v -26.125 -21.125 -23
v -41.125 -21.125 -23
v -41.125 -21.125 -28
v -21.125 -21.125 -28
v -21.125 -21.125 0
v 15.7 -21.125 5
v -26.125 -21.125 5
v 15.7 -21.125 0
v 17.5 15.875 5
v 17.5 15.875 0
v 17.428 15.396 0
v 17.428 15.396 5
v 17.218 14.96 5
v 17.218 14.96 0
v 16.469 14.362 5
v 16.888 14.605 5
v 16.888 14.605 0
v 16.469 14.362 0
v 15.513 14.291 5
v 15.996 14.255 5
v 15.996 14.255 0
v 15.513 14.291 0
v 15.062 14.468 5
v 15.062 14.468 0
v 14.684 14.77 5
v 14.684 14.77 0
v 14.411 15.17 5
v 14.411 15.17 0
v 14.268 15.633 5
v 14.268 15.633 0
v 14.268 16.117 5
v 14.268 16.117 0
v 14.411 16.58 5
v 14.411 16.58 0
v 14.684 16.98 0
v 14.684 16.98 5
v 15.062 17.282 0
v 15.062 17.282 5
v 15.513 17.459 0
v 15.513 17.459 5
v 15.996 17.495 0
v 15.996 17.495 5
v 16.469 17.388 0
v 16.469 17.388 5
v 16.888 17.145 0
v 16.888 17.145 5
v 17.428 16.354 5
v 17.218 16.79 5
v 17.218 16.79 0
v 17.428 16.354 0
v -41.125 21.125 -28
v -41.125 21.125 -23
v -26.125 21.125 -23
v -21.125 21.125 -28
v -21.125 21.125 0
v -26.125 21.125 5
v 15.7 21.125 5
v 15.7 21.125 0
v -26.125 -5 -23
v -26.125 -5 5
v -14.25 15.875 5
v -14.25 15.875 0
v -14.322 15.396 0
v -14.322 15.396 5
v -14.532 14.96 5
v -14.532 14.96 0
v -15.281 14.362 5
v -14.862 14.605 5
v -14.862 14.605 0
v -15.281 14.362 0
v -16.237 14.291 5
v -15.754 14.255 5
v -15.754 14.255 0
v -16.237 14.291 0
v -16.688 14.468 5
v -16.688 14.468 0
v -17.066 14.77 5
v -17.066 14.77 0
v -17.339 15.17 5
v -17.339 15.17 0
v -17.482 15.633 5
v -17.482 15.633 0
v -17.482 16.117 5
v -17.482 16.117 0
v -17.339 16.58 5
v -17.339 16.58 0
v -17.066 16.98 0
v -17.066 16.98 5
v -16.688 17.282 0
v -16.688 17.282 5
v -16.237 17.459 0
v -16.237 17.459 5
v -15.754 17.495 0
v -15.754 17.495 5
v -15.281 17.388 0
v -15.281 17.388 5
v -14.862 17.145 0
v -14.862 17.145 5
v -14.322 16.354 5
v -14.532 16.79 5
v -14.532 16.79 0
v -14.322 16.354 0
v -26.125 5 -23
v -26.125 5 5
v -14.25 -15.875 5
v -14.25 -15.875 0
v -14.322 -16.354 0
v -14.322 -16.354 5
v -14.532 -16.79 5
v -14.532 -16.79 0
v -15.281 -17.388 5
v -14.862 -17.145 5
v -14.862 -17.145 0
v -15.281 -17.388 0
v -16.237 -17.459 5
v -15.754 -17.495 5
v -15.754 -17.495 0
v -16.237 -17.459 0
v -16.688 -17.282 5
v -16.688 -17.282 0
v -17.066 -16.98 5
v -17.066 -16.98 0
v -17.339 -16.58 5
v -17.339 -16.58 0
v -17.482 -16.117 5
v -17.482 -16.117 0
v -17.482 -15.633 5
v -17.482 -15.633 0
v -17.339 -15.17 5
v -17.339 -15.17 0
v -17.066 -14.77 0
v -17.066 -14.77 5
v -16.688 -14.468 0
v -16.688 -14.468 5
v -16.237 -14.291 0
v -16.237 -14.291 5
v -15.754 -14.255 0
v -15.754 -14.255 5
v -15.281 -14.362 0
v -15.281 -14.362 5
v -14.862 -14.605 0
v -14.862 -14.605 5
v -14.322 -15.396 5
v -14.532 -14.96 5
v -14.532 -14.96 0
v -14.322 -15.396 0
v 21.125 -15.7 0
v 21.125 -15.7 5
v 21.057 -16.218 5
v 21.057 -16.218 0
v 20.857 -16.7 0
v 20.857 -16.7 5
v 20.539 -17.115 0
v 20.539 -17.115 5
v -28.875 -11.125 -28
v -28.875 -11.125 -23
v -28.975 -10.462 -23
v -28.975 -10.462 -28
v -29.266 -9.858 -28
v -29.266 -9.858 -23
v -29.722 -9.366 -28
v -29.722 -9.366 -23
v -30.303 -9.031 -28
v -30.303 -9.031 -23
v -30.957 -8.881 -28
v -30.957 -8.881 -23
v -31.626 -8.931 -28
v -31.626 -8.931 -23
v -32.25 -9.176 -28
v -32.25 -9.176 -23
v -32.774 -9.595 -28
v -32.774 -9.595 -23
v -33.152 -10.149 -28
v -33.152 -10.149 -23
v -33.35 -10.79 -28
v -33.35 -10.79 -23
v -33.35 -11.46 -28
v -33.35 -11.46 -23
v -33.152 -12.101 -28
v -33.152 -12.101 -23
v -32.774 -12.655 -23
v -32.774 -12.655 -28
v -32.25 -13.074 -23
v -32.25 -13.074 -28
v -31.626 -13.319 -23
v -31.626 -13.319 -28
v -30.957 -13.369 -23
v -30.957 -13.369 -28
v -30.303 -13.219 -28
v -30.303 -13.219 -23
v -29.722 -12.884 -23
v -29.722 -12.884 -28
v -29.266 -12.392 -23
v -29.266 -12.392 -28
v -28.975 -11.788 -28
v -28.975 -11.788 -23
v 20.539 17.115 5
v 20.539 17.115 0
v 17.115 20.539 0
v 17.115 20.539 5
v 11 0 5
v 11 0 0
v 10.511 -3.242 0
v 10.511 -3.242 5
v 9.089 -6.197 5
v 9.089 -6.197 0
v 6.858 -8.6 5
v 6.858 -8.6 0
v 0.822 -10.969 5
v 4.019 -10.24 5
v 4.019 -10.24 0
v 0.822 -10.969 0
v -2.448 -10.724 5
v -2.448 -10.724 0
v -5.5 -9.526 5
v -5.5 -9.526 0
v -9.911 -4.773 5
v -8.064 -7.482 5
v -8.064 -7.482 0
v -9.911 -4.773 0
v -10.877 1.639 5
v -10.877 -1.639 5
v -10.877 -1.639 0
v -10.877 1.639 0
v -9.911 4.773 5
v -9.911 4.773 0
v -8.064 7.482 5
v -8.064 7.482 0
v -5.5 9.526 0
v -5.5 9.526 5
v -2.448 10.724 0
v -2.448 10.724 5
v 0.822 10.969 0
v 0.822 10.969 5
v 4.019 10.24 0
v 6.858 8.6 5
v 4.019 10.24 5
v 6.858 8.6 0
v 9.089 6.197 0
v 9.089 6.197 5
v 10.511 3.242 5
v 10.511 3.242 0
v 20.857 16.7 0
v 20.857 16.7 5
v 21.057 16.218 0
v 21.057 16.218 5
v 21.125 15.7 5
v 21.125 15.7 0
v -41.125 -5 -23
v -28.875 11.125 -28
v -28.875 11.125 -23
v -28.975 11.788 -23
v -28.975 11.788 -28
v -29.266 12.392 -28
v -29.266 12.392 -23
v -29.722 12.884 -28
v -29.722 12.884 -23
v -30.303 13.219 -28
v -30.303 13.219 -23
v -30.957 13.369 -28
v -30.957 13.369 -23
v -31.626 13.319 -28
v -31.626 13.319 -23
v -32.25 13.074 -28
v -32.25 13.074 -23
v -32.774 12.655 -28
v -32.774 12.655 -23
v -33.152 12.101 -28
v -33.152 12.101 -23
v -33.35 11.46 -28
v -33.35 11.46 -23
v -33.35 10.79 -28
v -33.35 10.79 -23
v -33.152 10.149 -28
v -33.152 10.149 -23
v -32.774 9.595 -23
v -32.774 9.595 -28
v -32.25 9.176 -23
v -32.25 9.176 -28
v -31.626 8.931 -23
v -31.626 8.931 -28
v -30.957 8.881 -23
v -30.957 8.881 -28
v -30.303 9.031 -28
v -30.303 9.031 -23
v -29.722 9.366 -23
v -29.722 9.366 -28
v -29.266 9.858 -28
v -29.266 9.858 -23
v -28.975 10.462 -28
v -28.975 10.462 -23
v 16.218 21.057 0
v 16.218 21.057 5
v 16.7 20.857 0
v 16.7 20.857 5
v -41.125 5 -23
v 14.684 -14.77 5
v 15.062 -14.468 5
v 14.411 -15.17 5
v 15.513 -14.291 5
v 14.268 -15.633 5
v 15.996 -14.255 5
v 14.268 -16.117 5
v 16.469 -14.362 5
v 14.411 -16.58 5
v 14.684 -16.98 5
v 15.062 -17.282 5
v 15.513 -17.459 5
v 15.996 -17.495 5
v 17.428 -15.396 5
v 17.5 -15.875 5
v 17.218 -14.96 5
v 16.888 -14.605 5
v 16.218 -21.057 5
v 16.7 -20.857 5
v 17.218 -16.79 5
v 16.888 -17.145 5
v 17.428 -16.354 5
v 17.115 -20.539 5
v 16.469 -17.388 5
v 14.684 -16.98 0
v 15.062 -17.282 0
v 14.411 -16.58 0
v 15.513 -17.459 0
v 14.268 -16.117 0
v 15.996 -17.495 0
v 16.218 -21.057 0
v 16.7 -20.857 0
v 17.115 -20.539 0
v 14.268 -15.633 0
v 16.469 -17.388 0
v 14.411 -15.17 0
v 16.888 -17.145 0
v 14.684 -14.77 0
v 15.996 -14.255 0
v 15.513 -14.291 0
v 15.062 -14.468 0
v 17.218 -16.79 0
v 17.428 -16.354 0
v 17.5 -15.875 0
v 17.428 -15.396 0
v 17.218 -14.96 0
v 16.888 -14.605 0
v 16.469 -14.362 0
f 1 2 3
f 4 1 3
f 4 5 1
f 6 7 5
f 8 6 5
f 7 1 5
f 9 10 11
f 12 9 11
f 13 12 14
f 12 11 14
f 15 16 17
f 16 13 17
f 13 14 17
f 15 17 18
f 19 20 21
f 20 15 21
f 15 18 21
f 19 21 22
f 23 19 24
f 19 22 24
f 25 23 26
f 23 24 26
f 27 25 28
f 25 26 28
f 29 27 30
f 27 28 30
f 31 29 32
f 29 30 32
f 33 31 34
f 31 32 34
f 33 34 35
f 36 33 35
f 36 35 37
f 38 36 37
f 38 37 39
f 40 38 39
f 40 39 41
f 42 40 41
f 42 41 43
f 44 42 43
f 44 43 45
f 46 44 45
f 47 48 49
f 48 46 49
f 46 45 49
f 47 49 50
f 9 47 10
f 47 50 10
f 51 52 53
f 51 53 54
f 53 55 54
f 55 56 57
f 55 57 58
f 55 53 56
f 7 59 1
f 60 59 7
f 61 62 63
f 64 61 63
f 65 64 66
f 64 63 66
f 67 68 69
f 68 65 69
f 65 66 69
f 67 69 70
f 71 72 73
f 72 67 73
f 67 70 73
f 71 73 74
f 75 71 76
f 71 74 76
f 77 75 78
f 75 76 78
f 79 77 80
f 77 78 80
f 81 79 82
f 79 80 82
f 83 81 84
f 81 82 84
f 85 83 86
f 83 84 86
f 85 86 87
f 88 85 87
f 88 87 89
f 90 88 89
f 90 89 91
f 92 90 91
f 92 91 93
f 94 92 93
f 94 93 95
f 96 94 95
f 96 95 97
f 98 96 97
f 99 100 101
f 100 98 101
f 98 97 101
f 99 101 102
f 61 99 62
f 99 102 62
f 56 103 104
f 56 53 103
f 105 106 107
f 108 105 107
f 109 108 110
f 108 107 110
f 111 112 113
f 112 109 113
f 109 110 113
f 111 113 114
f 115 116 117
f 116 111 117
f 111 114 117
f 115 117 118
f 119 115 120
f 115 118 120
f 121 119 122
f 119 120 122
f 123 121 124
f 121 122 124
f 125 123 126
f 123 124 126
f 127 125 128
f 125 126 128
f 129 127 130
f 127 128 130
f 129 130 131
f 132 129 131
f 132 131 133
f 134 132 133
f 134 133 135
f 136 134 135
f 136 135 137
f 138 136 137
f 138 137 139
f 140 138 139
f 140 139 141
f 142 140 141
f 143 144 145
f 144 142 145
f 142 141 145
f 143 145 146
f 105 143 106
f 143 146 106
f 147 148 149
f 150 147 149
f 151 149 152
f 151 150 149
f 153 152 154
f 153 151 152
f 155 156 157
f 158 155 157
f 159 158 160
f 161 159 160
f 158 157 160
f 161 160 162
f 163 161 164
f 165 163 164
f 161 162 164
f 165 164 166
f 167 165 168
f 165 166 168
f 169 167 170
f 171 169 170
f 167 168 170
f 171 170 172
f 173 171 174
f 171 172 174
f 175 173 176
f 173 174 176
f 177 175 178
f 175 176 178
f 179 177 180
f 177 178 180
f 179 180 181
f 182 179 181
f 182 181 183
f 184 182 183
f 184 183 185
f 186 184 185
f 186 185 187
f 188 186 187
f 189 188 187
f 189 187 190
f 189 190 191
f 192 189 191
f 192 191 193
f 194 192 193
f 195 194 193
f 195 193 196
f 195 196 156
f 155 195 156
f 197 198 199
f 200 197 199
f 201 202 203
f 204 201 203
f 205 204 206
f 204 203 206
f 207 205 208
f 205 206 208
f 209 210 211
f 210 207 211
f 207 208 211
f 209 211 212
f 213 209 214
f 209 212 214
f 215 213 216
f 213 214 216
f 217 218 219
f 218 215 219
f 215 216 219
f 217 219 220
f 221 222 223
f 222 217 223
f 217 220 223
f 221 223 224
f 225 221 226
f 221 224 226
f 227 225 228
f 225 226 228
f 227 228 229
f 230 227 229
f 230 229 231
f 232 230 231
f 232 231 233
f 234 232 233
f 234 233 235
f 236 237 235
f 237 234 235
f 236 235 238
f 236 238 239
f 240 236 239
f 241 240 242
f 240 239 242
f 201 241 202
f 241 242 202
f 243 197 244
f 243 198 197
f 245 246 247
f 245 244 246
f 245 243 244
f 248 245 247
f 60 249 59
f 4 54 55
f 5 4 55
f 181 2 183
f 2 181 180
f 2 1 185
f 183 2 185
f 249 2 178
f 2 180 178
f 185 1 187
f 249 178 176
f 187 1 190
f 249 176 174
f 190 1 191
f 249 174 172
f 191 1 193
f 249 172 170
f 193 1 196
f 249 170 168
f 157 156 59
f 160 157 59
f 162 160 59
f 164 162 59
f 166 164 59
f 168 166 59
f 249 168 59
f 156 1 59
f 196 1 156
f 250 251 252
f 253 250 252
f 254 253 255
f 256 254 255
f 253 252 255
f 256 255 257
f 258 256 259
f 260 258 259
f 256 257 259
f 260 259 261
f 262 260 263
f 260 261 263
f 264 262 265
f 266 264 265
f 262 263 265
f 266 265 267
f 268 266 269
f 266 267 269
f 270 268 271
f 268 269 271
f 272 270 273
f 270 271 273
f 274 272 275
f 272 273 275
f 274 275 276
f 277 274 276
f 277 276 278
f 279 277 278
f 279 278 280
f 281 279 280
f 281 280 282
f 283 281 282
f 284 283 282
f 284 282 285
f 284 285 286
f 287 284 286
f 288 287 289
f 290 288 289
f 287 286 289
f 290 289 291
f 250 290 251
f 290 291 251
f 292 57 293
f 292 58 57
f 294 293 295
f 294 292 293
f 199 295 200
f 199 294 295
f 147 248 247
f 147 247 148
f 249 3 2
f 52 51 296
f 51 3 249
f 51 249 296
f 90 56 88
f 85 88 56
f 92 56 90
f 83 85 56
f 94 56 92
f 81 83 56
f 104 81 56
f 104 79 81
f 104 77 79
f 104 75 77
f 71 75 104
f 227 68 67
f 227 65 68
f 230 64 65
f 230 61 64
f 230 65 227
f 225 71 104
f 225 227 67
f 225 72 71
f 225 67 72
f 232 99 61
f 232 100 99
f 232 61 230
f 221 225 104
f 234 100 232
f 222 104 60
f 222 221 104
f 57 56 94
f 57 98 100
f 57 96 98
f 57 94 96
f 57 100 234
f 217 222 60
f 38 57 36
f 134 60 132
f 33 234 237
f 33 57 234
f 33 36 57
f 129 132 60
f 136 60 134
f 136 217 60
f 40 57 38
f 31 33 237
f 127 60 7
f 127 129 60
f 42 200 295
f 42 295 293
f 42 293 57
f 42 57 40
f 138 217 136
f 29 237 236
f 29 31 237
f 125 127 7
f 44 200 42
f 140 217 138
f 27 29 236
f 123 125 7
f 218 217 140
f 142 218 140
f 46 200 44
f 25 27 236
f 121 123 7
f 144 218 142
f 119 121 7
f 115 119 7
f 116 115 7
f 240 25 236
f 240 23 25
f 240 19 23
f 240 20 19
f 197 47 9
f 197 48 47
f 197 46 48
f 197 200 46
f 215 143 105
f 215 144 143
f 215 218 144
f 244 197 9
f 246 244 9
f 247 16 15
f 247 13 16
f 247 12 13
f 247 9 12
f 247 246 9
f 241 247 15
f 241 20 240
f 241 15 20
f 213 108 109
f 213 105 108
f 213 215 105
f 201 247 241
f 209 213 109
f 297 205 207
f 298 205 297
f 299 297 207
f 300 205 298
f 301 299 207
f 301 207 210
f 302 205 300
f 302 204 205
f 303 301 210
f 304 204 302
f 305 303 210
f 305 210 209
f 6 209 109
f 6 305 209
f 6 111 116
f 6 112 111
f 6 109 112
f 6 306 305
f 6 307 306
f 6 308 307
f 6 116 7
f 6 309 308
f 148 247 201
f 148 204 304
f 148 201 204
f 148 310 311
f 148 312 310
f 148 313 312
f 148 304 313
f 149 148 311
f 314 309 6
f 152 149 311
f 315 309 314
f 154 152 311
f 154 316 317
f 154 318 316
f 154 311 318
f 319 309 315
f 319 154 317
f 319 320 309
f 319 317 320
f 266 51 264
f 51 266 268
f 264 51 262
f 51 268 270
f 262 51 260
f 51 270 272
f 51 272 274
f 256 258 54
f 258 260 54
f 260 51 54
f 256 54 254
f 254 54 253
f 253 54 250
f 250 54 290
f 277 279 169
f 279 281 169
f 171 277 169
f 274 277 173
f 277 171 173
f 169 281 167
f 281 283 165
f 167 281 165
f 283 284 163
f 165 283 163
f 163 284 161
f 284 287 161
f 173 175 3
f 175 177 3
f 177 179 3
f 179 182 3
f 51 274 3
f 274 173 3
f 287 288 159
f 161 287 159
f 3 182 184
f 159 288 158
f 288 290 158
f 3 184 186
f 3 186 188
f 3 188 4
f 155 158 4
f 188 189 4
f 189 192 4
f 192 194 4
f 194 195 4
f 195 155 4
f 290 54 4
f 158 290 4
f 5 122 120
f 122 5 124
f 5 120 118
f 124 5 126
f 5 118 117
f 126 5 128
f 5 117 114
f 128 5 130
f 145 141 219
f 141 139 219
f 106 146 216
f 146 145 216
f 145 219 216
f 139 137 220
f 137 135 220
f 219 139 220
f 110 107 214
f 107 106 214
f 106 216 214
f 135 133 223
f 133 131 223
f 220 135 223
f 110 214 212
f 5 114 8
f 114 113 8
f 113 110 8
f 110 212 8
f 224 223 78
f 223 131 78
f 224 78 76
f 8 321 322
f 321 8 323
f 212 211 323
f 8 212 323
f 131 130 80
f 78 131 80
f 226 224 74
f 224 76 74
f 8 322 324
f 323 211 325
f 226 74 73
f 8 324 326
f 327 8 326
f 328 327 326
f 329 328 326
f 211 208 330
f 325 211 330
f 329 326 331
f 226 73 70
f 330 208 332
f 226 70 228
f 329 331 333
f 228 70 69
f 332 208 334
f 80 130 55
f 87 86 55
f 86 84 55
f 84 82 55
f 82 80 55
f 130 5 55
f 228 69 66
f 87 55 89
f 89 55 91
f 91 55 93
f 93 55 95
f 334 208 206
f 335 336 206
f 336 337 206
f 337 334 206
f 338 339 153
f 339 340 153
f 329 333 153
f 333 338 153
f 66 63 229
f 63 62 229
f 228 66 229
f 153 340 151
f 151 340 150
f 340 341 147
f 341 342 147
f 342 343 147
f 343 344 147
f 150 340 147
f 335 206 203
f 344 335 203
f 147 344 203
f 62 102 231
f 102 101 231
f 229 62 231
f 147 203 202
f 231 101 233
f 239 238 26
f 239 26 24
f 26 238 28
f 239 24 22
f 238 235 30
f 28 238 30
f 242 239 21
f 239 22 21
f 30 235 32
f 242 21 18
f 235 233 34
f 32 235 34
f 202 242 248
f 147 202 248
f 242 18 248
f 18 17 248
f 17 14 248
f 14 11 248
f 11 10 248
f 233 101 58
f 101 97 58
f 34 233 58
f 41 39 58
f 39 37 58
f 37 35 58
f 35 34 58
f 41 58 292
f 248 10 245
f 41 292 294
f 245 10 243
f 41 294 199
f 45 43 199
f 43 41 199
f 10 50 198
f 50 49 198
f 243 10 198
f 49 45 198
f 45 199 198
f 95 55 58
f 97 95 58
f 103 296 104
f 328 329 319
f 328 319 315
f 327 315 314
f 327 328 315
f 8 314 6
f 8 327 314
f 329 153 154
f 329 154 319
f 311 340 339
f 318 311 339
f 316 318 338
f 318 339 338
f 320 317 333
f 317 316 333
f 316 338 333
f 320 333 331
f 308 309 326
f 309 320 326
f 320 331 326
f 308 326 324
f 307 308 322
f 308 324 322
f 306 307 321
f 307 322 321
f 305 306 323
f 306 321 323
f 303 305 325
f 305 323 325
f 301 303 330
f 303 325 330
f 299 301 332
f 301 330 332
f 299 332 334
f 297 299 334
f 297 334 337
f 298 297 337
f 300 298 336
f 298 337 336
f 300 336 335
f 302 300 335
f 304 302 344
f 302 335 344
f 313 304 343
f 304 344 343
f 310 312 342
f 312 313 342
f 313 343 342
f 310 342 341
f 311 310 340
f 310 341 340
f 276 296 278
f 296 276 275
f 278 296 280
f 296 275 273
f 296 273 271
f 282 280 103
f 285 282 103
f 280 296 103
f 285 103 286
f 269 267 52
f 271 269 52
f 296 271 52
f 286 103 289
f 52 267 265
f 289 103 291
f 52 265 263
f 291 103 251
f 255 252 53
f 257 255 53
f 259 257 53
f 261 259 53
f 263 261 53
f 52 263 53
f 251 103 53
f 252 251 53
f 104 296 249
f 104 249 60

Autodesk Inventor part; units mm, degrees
ref_plane "YZ Plane" through (0, 0, 0) normal (1, 0, 0) x (0, 1, 0)
ref_plane "XZ Plane" through (0, 0, 0) normal (0, 1, 0) x (-1, 0, 0)
sketch "Sketch1" plane through (0, 0, 0) normal (0, 0, 1) x (1, 0, 0)
  arc A0 (-20.5392, 17.1146) -> (-21.125, 15.7004) centre (-19.125, 15.7004) ccw projected
  line L0 (-21.125, -15.7004) -> (-21.125, 15.7004) projected
  arc A1 (-21.125, -15.7004) -> (-20.5392, -17.1146) centre (-19.125, -15.7004) ccw projected
  line L1 (-20.5392, -17.1146) -> (-17.1146, -20.5392) projected
  arc A2 (-17.1146, -20.5392) -> (-15.7004, -21.125) centre (-15.7004, -19.125) ccw projected
  line L2 (15.7004, -21.125) -> (-15.7004, -21.125) projected
  arc A3 (15.7004, -21.125) -> (17.1146, -20.5392) centre (15.7004, -19.125) ccw projected
  line L3 (20.5392, -17.1146) -> (17.1146, -20.5392) projected
  arc A4 (20.5392, -17.1146) -> (21.125, -15.7004) centre (19.125, -15.7004) ccw projected
  line L4 (21.125, 15.7004) -> (21.125, -15.7004) projected
  arc A5 (21.125, 15.7004) -> (20.5392, 17.1146) centre (19.125, 15.7004) ccw projected
  line L5 (20.5392, 17.1146) -> (17.1146, 20.5392) projected
  arc A6 (17.1146, 20.5392) -> (15.7004, 21.125) centre (15.7004, 19.125) ccw projected
  line L6 (-15.7004, 21.125) -> (15.7004, 21.125) projected
  arc A7 (-15.7004, 21.125) -> (-17.1146, 20.5392) centre (-15.7004, 19.125) ccw projected
  line L7 (-20.5392, 17.1146) -> (-17.1146, 20.5392) projected
  circle A8 centre (0, 0) radius 16 projected
  circle A9 centre (-15.875, -15.875) radius 1.625 projected
  circle A10 centre (15.875, 15.875) radius 1.625 projected
  circle A11 centre (-15.875, 15.875) radius 1.625 projected
  circle A12 centre (15.875, -15.875) radius 1.625 projected
  circle A13 centre (0, 0) radius 11 projected
  point P0 (0, 0)
extrude "Extrusion1" add sketch "Sketch1" along normal blind 5 contours L7 A7 L6 A6 L5 A5 L4 A4 L3 A3 L2 A2 L1 A1 L0 A0 | A8
sketch "Sketch2" plane through (-21.125, -15.7004, 0) normal (-1, 0, 0) x (0, 0, 1)
  line L0 (0, -5.4246) -> (5, -5.4246) projected
  line L1 (5, -5.4246) -> (-28, -5.4246)
  line L2 (-28, -5.4246) -> (-28, 36.8254)
  line L3 (-28, 36.8254) -> (5, 36.8254)
  line L4 (5, 36.8254) -> (5, -5.4246)
  point P0 (0, 15.7004)
  dimension "d6" = 33
extrude "Extrusion2" add sketch "Sketch2" along normal blind 5
sketch "Sketch3" plane through (0, 0, 5) normal (0, 0, 1) x (1, 0, 0)
  line L0 (-21.125, -15.7004) -> (-21.125, -21.125) projected
  arc A0 (-21.125, -15.7004) -> (-20.5392, -17.1146) centre (-19.125, -15.7004) ccw projected
  arc A1 (-17.1146, -20.5392) -> (-15.7004, -21.125) centre (-15.7004, -19.125) ccw projected
  line L1 (-20.5392, -17.1146) -> (-17.1146, -20.5392) projected
  line L2 (-21.125, -21.125) -> (-15.7004, -21.125)
  line L3 (-21.125, 21.125) -> (-21.125, 15.7004) projected
  arc A2 (-15.7004, 21.125) -> (-17.1146, 20.5392) centre (-15.7004, 19.125) ccw projected
  line L4 (-21.125, 21.125) -> (-15.7004, 21.125)
  line L5 (-17.1146, 20.5392) -> (-20.5392, 17.1146) projected
  arc A3 (-20.5392, 17.1146) -> (-21.125, 15.7004) centre (-19.125, 15.7004) ccw projected
  point P0 (0, 0)
extrude "Extrusion3" add sketch "Sketch3" against normal blind 5
sketch "Sketch4" plane through (-26.125, -15.7004, 0) normal (-1, 0, 0) x (0, 0, 1)
  line L0 (0, -5.4246) -> (-28, -5.4246) projected
  line L1 (5, 36.8254) -> (-28, 36.8254) projected
  line L2 (-28, -5.4246) -> (-23, -5.4246)
  line L3 (-23, -5.4246) -> (-23, 36.8254)
  line L4 (-23, 36.8254) -> (-28, 36.8254)
  line L5 (-28, 36.8254) -> (-28, -5.4246)
  point P0 (0, 15.7004)
  dimension "d7" = 5
extrude "Extrusion4" add sketch "Sketch4" along normal blind 15
sketch "Sketch5" plane through (-26.125, -21.125, -23) normal (0, 0, 1) x (1, 0, 0)
  circle A0 centre (-5, 32.25) radius 2.25
  circle A1 centre (-5, 10) radius 2.25
  line L0 (0, 42.25) -> (-15, 42.25) projected
  line L1 (-15, 0) -> (-15, 42.25) projected
  line L2 (0, 0) -> (-15, 0) projected
  point P0 (26.125, 21.125)
  dimension "d10" = 10
  dimension "d11" = 10
  dimension "d12" = 10
  dimension "d13" = 10
  dimension "d14" = 4.5
  dimension "d15" = 4.5
extrude "Extrusion5" cut sketch "Sketch5" along normal through all both and the other way through all
ref_plane "Work Plane1" through (15.7004, 0, 0) normal (0, -1, 0) x (1, 0, 0)
sketch "Sketch6" plane through (15.7004, 0, 0) normal (0, -1, 0) x (1, 0, 0)
  line L0 (-41.8254, -23) -> (-56.8254, -23) projected
  line L1 (0, 5) -> (-41.8254, 5) projected
  line L2 (-56.8254, -23) -> (-41.8254, 5)
  line L3 (-41.8254, 5) -> (-41.8254, -23)
  line L4 (-41.8254, -23) -> (-56.8254, -23)
  point P0 (-15.7004, 0)
extrude "Extrusion6" add sketch "Sketch6" along normal mid plane 10
equation "\"d15\" = d14"
properties part number "StepperZHolder"
